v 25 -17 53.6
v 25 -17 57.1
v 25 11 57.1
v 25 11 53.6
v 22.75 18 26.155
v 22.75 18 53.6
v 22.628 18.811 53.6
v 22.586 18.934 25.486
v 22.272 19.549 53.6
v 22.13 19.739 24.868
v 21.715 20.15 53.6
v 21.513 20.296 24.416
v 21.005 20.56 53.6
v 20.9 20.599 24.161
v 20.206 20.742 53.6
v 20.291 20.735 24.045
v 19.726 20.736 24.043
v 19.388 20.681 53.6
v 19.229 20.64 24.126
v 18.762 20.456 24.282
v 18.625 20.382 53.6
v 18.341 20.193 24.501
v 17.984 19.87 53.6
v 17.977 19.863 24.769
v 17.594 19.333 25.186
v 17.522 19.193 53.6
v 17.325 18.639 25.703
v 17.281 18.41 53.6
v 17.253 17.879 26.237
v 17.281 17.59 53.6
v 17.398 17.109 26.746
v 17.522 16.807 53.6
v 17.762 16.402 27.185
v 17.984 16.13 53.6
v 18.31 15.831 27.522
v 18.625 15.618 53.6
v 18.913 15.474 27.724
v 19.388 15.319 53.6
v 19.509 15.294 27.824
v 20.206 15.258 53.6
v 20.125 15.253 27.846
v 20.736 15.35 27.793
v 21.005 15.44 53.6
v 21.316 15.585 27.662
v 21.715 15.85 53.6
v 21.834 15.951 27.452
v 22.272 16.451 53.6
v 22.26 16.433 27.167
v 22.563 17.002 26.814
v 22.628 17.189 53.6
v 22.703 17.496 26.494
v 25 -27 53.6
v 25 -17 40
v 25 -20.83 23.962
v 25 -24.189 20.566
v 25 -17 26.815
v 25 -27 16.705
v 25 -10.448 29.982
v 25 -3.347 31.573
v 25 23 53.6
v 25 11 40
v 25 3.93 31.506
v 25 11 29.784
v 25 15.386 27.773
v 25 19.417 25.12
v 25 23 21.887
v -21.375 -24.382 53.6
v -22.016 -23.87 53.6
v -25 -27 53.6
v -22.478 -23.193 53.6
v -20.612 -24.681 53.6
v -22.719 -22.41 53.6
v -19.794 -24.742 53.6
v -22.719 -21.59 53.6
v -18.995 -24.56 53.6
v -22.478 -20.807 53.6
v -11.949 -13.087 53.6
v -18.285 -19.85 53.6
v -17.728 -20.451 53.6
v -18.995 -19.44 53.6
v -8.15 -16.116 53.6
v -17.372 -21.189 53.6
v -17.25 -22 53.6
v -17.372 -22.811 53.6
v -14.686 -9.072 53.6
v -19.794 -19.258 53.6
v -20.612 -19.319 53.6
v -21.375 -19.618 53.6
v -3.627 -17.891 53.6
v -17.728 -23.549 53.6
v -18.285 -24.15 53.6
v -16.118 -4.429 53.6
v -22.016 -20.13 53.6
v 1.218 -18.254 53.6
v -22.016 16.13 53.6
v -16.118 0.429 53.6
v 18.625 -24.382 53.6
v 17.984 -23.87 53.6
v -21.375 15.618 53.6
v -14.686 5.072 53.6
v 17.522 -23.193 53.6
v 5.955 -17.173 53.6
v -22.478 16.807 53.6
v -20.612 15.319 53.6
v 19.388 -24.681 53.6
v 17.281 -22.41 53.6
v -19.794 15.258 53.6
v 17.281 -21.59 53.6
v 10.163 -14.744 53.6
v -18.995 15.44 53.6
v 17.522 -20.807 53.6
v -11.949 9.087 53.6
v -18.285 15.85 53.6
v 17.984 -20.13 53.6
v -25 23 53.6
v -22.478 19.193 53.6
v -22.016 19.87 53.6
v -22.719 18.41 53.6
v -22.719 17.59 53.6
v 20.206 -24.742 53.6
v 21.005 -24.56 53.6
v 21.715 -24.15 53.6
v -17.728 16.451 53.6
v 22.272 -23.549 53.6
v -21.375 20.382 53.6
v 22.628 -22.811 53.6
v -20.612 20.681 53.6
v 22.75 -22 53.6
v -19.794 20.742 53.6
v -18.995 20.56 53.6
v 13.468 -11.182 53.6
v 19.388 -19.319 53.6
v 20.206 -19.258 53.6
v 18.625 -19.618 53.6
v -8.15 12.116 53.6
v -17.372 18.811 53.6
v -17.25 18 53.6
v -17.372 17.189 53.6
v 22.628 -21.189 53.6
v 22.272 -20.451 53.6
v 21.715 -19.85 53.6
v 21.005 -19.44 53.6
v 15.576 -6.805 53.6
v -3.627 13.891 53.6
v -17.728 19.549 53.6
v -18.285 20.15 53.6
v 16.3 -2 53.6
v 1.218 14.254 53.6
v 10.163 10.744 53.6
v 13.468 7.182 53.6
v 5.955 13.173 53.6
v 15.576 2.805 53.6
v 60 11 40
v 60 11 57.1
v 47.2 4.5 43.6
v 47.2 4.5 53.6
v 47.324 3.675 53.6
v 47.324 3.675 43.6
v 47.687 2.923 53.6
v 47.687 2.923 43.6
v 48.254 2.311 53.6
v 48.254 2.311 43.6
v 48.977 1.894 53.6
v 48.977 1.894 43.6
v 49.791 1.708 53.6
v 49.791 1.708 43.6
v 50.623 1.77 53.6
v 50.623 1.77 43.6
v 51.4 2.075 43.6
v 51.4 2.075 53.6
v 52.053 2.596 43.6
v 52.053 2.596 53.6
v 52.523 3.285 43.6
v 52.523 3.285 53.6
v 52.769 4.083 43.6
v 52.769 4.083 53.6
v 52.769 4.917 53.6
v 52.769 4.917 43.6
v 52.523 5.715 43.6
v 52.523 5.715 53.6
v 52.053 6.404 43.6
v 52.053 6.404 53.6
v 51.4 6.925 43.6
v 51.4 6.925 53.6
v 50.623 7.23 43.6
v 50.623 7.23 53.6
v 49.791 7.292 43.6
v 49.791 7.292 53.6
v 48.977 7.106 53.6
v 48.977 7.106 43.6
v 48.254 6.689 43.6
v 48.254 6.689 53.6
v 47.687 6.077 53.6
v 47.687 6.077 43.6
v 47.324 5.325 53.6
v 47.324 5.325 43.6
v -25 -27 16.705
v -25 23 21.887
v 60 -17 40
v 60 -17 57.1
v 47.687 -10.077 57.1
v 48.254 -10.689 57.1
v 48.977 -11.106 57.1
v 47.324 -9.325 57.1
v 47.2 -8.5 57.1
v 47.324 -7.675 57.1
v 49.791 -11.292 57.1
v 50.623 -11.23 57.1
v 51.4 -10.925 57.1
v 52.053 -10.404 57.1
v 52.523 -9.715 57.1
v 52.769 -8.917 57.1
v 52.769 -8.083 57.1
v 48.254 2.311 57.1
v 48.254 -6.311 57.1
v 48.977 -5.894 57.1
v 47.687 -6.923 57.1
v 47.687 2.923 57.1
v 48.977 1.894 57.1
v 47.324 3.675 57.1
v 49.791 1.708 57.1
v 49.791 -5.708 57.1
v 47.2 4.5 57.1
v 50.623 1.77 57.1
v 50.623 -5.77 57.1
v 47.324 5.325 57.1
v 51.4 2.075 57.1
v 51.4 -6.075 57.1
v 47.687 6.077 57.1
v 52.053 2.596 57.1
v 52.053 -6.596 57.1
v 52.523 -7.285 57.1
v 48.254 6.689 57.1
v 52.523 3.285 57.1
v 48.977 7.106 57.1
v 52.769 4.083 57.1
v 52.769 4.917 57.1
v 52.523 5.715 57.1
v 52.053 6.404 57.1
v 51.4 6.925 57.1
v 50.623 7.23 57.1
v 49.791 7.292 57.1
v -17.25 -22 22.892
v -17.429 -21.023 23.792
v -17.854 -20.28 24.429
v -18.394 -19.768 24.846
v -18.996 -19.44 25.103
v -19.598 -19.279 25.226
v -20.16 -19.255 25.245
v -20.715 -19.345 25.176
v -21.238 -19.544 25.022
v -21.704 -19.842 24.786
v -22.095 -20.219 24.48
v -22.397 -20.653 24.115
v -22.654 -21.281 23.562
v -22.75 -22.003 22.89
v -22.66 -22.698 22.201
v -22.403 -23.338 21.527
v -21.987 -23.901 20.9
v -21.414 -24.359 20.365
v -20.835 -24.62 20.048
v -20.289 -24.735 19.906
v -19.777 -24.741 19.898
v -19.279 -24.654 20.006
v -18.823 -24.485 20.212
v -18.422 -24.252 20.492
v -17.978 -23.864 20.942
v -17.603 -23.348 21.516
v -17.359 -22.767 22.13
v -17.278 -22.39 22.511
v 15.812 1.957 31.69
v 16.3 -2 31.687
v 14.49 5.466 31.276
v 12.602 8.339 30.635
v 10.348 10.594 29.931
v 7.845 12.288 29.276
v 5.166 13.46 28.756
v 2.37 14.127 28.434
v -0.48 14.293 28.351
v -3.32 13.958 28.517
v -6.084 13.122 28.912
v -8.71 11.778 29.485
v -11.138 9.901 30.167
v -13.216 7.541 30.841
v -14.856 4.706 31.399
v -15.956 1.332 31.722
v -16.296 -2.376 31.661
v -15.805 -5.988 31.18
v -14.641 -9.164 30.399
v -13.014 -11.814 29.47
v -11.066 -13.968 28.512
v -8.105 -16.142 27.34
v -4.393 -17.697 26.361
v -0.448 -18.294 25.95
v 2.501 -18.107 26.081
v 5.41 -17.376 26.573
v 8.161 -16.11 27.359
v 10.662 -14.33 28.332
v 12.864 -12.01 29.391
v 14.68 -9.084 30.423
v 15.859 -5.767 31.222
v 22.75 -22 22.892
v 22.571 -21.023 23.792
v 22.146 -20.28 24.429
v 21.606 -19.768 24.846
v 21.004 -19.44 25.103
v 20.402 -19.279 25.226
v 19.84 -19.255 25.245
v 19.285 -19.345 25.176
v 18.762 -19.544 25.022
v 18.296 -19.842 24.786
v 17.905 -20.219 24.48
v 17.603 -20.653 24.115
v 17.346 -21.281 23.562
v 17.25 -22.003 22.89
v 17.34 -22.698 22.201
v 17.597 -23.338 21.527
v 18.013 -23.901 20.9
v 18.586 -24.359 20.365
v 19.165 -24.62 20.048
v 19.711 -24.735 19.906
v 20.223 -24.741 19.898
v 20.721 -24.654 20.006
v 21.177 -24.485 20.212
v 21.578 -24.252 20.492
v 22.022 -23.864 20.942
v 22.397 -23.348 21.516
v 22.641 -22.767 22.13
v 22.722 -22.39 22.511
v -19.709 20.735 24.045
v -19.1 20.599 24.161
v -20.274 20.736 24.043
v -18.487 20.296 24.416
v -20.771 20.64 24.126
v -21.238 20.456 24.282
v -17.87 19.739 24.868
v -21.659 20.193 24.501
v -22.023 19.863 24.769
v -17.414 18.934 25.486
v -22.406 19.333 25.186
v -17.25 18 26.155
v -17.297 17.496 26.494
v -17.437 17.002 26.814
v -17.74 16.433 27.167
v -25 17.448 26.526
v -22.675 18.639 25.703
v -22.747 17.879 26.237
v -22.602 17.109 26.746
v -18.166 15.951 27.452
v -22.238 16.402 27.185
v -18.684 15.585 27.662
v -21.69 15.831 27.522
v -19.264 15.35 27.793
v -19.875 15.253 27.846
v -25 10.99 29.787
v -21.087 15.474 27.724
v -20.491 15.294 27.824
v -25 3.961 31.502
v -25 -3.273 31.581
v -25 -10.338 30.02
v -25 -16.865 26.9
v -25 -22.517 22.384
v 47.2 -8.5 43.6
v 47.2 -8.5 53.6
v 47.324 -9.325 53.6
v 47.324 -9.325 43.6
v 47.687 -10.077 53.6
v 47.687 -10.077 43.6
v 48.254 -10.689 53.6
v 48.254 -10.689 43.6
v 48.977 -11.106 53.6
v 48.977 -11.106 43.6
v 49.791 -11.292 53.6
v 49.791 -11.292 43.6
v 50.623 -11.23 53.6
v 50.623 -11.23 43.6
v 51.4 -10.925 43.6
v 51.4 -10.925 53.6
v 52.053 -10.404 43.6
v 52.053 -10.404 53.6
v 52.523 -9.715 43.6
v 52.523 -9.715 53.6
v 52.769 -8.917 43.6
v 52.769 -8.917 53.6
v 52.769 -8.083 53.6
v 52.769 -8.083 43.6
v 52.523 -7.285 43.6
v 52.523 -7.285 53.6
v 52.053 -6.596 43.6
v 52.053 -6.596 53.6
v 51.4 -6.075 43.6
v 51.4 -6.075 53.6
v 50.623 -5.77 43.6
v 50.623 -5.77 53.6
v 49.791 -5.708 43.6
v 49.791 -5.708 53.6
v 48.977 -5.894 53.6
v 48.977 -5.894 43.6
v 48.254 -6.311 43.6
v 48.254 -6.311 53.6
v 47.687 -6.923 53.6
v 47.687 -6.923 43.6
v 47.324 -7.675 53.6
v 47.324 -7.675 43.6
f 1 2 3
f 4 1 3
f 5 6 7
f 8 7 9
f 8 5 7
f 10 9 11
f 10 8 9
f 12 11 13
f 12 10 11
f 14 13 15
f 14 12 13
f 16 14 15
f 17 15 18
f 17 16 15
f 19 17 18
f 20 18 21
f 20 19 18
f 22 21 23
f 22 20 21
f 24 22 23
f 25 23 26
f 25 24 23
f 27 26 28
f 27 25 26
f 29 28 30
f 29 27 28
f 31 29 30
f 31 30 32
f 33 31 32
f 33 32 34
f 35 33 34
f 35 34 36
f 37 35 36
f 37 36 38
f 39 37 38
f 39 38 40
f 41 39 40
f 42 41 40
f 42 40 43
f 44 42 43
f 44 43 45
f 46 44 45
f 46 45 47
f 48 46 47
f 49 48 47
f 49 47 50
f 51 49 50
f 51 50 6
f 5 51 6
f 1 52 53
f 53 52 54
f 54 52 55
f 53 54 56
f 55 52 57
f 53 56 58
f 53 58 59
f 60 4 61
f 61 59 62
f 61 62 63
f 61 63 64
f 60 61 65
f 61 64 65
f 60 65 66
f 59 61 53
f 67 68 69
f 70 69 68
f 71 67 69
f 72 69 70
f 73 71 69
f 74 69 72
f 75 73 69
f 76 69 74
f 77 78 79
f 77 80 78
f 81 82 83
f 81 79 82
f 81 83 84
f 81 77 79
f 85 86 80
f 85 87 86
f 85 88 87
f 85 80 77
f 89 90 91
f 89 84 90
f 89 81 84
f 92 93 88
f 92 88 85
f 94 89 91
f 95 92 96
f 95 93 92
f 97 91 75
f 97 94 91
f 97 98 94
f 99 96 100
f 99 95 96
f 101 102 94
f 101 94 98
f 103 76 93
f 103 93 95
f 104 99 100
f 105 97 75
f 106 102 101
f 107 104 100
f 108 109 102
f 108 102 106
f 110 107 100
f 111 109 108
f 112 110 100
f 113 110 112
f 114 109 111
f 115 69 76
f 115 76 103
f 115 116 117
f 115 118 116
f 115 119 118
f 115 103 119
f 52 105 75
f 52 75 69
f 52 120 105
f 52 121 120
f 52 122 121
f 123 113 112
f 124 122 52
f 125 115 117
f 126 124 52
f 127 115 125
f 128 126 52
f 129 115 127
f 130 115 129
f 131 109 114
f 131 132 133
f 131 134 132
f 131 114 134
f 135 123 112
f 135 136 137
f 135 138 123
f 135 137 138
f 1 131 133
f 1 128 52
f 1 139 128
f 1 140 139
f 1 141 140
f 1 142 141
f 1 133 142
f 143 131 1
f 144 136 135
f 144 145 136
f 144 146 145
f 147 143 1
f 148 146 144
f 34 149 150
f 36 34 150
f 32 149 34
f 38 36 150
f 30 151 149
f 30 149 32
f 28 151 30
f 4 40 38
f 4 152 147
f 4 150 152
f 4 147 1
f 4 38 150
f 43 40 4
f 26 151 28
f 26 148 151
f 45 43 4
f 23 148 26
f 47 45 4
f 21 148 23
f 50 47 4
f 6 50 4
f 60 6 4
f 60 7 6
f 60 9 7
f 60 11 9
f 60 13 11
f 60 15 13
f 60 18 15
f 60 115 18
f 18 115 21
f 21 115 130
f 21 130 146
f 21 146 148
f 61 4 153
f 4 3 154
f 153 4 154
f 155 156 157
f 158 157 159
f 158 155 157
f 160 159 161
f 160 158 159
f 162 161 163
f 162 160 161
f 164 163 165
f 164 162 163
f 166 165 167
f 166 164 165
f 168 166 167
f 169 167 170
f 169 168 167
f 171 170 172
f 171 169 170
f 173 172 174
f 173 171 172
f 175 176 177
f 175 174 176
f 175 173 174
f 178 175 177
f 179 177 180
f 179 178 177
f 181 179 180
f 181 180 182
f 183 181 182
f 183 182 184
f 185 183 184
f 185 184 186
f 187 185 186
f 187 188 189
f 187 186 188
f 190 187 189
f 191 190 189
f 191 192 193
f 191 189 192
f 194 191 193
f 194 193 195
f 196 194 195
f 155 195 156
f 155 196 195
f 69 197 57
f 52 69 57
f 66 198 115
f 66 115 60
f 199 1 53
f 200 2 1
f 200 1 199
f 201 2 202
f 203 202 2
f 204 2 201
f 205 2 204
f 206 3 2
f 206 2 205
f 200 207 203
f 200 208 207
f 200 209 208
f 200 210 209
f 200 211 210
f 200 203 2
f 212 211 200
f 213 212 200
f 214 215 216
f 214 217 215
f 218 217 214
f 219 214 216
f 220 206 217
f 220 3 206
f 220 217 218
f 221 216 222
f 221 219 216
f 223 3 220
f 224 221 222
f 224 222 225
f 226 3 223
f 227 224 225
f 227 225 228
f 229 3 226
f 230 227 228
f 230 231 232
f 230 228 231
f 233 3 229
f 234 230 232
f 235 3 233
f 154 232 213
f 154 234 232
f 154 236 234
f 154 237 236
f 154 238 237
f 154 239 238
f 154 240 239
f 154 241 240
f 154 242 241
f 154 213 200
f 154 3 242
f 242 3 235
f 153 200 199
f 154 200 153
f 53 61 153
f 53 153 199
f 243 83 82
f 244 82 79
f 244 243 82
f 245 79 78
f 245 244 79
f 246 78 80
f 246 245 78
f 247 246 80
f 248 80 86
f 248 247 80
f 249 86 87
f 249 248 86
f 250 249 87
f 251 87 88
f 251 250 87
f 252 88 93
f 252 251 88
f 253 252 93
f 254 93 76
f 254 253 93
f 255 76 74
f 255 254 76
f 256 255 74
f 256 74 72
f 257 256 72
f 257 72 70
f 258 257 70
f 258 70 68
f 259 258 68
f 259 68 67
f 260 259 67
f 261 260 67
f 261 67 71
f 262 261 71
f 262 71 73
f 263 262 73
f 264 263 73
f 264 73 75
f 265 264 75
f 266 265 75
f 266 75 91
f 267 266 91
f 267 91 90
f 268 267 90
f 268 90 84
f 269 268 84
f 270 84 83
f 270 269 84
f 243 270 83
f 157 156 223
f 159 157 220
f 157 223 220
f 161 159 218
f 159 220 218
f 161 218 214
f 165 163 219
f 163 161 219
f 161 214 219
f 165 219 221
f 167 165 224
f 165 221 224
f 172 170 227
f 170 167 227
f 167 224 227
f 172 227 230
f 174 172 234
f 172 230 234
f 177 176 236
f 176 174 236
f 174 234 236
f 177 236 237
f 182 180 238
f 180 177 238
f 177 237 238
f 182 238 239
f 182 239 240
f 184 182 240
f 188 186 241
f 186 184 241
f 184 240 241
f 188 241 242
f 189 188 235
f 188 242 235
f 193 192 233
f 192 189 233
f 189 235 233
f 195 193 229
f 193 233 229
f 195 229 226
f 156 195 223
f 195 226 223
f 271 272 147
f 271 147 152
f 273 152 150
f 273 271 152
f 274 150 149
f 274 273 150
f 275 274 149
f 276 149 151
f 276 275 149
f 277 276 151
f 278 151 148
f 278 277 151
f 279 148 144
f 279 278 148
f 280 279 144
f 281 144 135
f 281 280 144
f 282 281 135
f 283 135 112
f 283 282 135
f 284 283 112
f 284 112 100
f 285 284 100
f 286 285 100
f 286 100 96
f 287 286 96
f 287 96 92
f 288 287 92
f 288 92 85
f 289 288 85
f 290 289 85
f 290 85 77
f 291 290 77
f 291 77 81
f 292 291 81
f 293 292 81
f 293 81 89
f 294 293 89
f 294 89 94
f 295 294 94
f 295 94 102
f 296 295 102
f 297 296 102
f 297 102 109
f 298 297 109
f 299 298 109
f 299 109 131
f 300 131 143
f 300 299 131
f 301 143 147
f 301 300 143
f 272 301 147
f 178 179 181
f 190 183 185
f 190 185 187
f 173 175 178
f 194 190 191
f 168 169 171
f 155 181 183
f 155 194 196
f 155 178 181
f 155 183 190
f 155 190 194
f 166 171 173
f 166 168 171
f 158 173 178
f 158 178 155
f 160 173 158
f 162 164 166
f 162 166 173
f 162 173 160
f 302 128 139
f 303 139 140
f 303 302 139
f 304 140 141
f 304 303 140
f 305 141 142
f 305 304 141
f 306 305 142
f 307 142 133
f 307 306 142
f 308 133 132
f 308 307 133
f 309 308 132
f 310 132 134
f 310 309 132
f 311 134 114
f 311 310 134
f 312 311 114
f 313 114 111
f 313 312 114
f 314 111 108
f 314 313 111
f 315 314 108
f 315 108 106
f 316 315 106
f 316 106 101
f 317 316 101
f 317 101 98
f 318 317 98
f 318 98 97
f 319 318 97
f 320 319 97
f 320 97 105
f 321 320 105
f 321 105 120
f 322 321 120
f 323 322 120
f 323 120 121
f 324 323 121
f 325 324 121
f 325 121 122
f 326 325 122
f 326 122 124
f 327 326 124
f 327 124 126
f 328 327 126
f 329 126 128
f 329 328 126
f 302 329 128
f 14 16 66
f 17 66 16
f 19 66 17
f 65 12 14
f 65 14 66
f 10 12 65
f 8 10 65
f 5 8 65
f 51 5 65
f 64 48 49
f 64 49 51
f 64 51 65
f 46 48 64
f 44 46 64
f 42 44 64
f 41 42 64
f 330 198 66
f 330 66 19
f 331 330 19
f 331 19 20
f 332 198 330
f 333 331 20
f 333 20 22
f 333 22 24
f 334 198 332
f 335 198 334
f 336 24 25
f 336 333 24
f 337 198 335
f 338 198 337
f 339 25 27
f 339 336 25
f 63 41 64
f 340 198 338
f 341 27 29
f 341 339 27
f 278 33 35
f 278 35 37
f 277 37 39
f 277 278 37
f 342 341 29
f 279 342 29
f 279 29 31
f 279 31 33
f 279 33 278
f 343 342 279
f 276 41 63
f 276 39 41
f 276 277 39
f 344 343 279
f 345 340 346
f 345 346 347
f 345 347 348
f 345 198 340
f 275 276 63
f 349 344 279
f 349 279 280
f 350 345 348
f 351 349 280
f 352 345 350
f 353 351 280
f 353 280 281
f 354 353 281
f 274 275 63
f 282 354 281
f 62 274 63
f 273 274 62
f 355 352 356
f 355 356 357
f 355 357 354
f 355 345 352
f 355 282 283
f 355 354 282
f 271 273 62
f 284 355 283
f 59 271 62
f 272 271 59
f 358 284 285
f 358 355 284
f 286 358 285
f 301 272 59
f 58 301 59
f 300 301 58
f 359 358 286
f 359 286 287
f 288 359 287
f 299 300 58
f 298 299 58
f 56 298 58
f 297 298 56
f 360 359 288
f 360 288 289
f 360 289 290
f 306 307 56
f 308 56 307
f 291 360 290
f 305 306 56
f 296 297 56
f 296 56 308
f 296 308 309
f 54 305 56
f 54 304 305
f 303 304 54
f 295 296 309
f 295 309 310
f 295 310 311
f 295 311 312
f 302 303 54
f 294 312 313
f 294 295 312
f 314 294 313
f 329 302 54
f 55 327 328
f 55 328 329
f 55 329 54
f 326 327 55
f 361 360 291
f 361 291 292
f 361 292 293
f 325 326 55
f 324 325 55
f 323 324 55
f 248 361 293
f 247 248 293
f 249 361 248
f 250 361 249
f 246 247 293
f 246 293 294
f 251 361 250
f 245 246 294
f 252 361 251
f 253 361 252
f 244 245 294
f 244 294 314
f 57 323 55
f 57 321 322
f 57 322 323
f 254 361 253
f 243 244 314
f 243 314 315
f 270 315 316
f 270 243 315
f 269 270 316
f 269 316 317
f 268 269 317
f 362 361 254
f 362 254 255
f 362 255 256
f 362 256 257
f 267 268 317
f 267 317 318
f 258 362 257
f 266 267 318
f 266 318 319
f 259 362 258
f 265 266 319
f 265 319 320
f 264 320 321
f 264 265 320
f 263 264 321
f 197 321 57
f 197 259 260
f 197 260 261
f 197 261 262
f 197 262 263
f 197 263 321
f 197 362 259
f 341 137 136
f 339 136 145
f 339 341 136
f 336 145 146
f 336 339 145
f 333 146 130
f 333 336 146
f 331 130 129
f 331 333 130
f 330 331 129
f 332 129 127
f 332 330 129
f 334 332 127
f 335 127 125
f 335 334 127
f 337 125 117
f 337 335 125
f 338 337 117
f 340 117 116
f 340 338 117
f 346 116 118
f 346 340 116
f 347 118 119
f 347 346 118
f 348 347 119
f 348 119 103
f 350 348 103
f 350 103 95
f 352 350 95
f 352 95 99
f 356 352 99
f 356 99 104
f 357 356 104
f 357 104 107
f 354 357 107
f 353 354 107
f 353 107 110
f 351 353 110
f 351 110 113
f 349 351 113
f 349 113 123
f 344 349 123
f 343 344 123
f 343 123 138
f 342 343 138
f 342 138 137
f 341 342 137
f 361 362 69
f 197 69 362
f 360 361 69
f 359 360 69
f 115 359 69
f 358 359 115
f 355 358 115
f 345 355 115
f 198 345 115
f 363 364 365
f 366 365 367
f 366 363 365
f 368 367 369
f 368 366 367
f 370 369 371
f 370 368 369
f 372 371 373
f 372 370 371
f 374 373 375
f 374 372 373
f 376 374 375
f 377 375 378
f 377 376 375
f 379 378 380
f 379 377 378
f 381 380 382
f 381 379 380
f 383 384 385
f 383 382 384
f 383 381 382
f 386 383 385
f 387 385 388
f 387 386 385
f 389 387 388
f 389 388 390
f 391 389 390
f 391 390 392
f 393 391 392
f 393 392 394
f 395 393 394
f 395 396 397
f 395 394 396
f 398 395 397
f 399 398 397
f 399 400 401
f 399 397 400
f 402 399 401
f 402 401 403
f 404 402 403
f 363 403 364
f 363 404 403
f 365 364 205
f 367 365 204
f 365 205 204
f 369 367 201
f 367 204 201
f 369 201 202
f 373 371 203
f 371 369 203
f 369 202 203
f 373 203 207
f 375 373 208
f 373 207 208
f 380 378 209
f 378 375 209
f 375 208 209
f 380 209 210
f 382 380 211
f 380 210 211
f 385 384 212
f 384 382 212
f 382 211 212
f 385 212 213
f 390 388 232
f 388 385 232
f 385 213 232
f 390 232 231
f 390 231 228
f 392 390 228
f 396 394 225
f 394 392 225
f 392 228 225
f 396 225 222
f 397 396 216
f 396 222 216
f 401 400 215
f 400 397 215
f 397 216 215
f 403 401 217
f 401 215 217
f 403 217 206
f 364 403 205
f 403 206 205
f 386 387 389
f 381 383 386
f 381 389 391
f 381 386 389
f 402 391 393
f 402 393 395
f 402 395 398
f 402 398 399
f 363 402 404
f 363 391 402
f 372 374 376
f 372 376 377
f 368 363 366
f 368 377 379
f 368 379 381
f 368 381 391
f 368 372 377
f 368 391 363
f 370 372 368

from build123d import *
from build123d.topology import SkipClean

# Parameters (mm, degrees)
SKETCH1_W               = 50
SKETCH1_H               = 50
SKETCH1_R               = 16.3
SKETCH1_R_2             = 2.75
BOSS_EXTRUDE1_DEPTH     = 53.6
CUT_EXTRUDE1_DEPTH      = 66.015075175
CUT_EXTRUDE1_DEPTH_BACK = 66.015075175
SKETCH2_R               = 31.75
BOSS_EXTRUDE3_START     = 35
BOSS_EXTRUDE3_DEPTH     = 35
CUT_EXTRUDE6_DEPTH      = 76.433606209
CUT_EXTRUDE6_DEPTH_BACK = 10
SKETCH10_R              = 2.8
CUT_EXTRUDE8_DEPTH      = 35
BOSS_EXTRUDE4_START     = 3.5
SKETCH16_W              = 35
SKETCH16_H              = 28
SKETCH16_R              = 2.8
BOSS_EXTRUDE4_DEPTH     = 3.5


with BuildPart() as part:
    # Sketch1 → Boss-Extrude1 (new body)
    with BuildSketch(Plane.XY):
        with Locations((0, -2)):
            Rectangle(SKETCH1_W, SKETCH1_H)
        with Locations((0, -2)):
            Circle(SKETCH1_R, mode=Mode.SUBTRACT)
        with Locations((-20, 18)):
            Circle(SKETCH1_R_2, mode=Mode.SUBTRACT)
        with Locations((20, 18)):
            Circle(SKETCH1_R_2, mode=Mode.SUBTRACT)
        with Locations((20, -22)):
            Circle(SKETCH1_R_2, mode=Mode.SUBTRACT)
        with Locations((-20, -22)):
            Circle(SKETCH1_R_2, mode=Mode.SUBTRACT)
    extrude(amount=BOSS_EXTRUDE1_DEPTH)

    # Sketch2 → Cut-Extrude1 (cut, two sides: drawn at the far end of the back side and taken through both)
    with BuildSketch(Plane(origin=(0, 0, 0), x_dir=(0, 0, -1), z_dir=(1, 0, 0)).offset(-CUT_EXTRUDE1_DEPTH_BACK)):
        Circle(SKETCH2_R)
    extrude(amount=CUT_EXTRUDE1_DEPTH + CUT_EXTRUDE1_DEPTH_BACK, mode=Mode.SUBTRACT)

    # Sketch4 → Boss-Extrude3 (add)
    with SkipClean():  # the faces are left unmerged after this step: merging them gives an invalid solid
        with BuildSketch(Plane(origin=(25, 0, 0), x_dir=(0, 0, -1), z_dir=(1, 0, 0)).offset(BOSS_EXTRUDE3_START)):
            with BuildLine():
                Line((-53.6, 11), (-53.6, -17))
                Line((-53.6, -17), (-26.815340759, -17))
                ThreePointArc((-26.815340759, -17), (-31.573087709, -3.347033393), (-29.783594477, 11))
                Line((-29.783594477, 11), (-53.6, 11))
            make_face()
        extrude(amount=-BOSS_EXTRUDE3_DEPTH)

    # Sketch10 → Cut-Extrude6 (cut, two sides: drawn at the far end of the back side and taken through both)
    with SkipClean():  # the faces are left unmerged after this step: merging them gives an invalid solid
        with BuildSketch(Plane.XY.offset(53.6).offset(-CUT_EXTRUDE6_DEPTH_BACK)):
            with Locations(Location((50, 4.5, 0), (0, 0, 180))):
                Circle(SKETCH10_R)
            with Locations(Location((50, -8.5, 0), (0, 0, 180))):
                Circle(SKETCH10_R)
        extrude(amount=CUT_EXTRUDE6_DEPTH + CUT_EXTRUDE6_DEPTH_BACK, mode=Mode.SUBTRACT)

    # Sketch13 → Cut-Extrude8 (cut)
    with BuildSketch(Plane(origin=(60, 0, 0), x_dir=(0, 0, -1), z_dir=(1, 0, 0))):
        with BuildLine():
            Line((-29.783594477, 11), (-40, 11))
            Line((-40, 11), (-40, -17))
            Line((-40, -17), (-26.815340759, -17))
            ThreePointArc((-26.815340759, -17), (-31.573087709, -3.347033393), (-29.783594477, 11))
        make_face()
    extrude(amount=-CUT_EXTRUDE8_DEPTH, mode=Mode.SUBTRACT)

    # Sketch16 → Boss-Extrude4 (add)
    with BuildSketch(Plane.XY.offset(53.6).offset(BOSS_EXTRUDE4_START)):
        with Locations((42.5, -3)):
            Rectangle(SKETCH16_W, SKETCH16_H)
        with Locations(Location((50, 4.5, 0), (0, 0, 180))):
            Circle(SKETCH16_R, mode=Mode.SUBTRACT)
        with Locations(Location((50, -8.5, 0), (0, 0, 180))):
            Circle(SKETCH16_R, mode=Mode.SUBTRACT)
    extrude(amount=-BOSS_EXTRUDE4_DEPTH)


solid = part.part
